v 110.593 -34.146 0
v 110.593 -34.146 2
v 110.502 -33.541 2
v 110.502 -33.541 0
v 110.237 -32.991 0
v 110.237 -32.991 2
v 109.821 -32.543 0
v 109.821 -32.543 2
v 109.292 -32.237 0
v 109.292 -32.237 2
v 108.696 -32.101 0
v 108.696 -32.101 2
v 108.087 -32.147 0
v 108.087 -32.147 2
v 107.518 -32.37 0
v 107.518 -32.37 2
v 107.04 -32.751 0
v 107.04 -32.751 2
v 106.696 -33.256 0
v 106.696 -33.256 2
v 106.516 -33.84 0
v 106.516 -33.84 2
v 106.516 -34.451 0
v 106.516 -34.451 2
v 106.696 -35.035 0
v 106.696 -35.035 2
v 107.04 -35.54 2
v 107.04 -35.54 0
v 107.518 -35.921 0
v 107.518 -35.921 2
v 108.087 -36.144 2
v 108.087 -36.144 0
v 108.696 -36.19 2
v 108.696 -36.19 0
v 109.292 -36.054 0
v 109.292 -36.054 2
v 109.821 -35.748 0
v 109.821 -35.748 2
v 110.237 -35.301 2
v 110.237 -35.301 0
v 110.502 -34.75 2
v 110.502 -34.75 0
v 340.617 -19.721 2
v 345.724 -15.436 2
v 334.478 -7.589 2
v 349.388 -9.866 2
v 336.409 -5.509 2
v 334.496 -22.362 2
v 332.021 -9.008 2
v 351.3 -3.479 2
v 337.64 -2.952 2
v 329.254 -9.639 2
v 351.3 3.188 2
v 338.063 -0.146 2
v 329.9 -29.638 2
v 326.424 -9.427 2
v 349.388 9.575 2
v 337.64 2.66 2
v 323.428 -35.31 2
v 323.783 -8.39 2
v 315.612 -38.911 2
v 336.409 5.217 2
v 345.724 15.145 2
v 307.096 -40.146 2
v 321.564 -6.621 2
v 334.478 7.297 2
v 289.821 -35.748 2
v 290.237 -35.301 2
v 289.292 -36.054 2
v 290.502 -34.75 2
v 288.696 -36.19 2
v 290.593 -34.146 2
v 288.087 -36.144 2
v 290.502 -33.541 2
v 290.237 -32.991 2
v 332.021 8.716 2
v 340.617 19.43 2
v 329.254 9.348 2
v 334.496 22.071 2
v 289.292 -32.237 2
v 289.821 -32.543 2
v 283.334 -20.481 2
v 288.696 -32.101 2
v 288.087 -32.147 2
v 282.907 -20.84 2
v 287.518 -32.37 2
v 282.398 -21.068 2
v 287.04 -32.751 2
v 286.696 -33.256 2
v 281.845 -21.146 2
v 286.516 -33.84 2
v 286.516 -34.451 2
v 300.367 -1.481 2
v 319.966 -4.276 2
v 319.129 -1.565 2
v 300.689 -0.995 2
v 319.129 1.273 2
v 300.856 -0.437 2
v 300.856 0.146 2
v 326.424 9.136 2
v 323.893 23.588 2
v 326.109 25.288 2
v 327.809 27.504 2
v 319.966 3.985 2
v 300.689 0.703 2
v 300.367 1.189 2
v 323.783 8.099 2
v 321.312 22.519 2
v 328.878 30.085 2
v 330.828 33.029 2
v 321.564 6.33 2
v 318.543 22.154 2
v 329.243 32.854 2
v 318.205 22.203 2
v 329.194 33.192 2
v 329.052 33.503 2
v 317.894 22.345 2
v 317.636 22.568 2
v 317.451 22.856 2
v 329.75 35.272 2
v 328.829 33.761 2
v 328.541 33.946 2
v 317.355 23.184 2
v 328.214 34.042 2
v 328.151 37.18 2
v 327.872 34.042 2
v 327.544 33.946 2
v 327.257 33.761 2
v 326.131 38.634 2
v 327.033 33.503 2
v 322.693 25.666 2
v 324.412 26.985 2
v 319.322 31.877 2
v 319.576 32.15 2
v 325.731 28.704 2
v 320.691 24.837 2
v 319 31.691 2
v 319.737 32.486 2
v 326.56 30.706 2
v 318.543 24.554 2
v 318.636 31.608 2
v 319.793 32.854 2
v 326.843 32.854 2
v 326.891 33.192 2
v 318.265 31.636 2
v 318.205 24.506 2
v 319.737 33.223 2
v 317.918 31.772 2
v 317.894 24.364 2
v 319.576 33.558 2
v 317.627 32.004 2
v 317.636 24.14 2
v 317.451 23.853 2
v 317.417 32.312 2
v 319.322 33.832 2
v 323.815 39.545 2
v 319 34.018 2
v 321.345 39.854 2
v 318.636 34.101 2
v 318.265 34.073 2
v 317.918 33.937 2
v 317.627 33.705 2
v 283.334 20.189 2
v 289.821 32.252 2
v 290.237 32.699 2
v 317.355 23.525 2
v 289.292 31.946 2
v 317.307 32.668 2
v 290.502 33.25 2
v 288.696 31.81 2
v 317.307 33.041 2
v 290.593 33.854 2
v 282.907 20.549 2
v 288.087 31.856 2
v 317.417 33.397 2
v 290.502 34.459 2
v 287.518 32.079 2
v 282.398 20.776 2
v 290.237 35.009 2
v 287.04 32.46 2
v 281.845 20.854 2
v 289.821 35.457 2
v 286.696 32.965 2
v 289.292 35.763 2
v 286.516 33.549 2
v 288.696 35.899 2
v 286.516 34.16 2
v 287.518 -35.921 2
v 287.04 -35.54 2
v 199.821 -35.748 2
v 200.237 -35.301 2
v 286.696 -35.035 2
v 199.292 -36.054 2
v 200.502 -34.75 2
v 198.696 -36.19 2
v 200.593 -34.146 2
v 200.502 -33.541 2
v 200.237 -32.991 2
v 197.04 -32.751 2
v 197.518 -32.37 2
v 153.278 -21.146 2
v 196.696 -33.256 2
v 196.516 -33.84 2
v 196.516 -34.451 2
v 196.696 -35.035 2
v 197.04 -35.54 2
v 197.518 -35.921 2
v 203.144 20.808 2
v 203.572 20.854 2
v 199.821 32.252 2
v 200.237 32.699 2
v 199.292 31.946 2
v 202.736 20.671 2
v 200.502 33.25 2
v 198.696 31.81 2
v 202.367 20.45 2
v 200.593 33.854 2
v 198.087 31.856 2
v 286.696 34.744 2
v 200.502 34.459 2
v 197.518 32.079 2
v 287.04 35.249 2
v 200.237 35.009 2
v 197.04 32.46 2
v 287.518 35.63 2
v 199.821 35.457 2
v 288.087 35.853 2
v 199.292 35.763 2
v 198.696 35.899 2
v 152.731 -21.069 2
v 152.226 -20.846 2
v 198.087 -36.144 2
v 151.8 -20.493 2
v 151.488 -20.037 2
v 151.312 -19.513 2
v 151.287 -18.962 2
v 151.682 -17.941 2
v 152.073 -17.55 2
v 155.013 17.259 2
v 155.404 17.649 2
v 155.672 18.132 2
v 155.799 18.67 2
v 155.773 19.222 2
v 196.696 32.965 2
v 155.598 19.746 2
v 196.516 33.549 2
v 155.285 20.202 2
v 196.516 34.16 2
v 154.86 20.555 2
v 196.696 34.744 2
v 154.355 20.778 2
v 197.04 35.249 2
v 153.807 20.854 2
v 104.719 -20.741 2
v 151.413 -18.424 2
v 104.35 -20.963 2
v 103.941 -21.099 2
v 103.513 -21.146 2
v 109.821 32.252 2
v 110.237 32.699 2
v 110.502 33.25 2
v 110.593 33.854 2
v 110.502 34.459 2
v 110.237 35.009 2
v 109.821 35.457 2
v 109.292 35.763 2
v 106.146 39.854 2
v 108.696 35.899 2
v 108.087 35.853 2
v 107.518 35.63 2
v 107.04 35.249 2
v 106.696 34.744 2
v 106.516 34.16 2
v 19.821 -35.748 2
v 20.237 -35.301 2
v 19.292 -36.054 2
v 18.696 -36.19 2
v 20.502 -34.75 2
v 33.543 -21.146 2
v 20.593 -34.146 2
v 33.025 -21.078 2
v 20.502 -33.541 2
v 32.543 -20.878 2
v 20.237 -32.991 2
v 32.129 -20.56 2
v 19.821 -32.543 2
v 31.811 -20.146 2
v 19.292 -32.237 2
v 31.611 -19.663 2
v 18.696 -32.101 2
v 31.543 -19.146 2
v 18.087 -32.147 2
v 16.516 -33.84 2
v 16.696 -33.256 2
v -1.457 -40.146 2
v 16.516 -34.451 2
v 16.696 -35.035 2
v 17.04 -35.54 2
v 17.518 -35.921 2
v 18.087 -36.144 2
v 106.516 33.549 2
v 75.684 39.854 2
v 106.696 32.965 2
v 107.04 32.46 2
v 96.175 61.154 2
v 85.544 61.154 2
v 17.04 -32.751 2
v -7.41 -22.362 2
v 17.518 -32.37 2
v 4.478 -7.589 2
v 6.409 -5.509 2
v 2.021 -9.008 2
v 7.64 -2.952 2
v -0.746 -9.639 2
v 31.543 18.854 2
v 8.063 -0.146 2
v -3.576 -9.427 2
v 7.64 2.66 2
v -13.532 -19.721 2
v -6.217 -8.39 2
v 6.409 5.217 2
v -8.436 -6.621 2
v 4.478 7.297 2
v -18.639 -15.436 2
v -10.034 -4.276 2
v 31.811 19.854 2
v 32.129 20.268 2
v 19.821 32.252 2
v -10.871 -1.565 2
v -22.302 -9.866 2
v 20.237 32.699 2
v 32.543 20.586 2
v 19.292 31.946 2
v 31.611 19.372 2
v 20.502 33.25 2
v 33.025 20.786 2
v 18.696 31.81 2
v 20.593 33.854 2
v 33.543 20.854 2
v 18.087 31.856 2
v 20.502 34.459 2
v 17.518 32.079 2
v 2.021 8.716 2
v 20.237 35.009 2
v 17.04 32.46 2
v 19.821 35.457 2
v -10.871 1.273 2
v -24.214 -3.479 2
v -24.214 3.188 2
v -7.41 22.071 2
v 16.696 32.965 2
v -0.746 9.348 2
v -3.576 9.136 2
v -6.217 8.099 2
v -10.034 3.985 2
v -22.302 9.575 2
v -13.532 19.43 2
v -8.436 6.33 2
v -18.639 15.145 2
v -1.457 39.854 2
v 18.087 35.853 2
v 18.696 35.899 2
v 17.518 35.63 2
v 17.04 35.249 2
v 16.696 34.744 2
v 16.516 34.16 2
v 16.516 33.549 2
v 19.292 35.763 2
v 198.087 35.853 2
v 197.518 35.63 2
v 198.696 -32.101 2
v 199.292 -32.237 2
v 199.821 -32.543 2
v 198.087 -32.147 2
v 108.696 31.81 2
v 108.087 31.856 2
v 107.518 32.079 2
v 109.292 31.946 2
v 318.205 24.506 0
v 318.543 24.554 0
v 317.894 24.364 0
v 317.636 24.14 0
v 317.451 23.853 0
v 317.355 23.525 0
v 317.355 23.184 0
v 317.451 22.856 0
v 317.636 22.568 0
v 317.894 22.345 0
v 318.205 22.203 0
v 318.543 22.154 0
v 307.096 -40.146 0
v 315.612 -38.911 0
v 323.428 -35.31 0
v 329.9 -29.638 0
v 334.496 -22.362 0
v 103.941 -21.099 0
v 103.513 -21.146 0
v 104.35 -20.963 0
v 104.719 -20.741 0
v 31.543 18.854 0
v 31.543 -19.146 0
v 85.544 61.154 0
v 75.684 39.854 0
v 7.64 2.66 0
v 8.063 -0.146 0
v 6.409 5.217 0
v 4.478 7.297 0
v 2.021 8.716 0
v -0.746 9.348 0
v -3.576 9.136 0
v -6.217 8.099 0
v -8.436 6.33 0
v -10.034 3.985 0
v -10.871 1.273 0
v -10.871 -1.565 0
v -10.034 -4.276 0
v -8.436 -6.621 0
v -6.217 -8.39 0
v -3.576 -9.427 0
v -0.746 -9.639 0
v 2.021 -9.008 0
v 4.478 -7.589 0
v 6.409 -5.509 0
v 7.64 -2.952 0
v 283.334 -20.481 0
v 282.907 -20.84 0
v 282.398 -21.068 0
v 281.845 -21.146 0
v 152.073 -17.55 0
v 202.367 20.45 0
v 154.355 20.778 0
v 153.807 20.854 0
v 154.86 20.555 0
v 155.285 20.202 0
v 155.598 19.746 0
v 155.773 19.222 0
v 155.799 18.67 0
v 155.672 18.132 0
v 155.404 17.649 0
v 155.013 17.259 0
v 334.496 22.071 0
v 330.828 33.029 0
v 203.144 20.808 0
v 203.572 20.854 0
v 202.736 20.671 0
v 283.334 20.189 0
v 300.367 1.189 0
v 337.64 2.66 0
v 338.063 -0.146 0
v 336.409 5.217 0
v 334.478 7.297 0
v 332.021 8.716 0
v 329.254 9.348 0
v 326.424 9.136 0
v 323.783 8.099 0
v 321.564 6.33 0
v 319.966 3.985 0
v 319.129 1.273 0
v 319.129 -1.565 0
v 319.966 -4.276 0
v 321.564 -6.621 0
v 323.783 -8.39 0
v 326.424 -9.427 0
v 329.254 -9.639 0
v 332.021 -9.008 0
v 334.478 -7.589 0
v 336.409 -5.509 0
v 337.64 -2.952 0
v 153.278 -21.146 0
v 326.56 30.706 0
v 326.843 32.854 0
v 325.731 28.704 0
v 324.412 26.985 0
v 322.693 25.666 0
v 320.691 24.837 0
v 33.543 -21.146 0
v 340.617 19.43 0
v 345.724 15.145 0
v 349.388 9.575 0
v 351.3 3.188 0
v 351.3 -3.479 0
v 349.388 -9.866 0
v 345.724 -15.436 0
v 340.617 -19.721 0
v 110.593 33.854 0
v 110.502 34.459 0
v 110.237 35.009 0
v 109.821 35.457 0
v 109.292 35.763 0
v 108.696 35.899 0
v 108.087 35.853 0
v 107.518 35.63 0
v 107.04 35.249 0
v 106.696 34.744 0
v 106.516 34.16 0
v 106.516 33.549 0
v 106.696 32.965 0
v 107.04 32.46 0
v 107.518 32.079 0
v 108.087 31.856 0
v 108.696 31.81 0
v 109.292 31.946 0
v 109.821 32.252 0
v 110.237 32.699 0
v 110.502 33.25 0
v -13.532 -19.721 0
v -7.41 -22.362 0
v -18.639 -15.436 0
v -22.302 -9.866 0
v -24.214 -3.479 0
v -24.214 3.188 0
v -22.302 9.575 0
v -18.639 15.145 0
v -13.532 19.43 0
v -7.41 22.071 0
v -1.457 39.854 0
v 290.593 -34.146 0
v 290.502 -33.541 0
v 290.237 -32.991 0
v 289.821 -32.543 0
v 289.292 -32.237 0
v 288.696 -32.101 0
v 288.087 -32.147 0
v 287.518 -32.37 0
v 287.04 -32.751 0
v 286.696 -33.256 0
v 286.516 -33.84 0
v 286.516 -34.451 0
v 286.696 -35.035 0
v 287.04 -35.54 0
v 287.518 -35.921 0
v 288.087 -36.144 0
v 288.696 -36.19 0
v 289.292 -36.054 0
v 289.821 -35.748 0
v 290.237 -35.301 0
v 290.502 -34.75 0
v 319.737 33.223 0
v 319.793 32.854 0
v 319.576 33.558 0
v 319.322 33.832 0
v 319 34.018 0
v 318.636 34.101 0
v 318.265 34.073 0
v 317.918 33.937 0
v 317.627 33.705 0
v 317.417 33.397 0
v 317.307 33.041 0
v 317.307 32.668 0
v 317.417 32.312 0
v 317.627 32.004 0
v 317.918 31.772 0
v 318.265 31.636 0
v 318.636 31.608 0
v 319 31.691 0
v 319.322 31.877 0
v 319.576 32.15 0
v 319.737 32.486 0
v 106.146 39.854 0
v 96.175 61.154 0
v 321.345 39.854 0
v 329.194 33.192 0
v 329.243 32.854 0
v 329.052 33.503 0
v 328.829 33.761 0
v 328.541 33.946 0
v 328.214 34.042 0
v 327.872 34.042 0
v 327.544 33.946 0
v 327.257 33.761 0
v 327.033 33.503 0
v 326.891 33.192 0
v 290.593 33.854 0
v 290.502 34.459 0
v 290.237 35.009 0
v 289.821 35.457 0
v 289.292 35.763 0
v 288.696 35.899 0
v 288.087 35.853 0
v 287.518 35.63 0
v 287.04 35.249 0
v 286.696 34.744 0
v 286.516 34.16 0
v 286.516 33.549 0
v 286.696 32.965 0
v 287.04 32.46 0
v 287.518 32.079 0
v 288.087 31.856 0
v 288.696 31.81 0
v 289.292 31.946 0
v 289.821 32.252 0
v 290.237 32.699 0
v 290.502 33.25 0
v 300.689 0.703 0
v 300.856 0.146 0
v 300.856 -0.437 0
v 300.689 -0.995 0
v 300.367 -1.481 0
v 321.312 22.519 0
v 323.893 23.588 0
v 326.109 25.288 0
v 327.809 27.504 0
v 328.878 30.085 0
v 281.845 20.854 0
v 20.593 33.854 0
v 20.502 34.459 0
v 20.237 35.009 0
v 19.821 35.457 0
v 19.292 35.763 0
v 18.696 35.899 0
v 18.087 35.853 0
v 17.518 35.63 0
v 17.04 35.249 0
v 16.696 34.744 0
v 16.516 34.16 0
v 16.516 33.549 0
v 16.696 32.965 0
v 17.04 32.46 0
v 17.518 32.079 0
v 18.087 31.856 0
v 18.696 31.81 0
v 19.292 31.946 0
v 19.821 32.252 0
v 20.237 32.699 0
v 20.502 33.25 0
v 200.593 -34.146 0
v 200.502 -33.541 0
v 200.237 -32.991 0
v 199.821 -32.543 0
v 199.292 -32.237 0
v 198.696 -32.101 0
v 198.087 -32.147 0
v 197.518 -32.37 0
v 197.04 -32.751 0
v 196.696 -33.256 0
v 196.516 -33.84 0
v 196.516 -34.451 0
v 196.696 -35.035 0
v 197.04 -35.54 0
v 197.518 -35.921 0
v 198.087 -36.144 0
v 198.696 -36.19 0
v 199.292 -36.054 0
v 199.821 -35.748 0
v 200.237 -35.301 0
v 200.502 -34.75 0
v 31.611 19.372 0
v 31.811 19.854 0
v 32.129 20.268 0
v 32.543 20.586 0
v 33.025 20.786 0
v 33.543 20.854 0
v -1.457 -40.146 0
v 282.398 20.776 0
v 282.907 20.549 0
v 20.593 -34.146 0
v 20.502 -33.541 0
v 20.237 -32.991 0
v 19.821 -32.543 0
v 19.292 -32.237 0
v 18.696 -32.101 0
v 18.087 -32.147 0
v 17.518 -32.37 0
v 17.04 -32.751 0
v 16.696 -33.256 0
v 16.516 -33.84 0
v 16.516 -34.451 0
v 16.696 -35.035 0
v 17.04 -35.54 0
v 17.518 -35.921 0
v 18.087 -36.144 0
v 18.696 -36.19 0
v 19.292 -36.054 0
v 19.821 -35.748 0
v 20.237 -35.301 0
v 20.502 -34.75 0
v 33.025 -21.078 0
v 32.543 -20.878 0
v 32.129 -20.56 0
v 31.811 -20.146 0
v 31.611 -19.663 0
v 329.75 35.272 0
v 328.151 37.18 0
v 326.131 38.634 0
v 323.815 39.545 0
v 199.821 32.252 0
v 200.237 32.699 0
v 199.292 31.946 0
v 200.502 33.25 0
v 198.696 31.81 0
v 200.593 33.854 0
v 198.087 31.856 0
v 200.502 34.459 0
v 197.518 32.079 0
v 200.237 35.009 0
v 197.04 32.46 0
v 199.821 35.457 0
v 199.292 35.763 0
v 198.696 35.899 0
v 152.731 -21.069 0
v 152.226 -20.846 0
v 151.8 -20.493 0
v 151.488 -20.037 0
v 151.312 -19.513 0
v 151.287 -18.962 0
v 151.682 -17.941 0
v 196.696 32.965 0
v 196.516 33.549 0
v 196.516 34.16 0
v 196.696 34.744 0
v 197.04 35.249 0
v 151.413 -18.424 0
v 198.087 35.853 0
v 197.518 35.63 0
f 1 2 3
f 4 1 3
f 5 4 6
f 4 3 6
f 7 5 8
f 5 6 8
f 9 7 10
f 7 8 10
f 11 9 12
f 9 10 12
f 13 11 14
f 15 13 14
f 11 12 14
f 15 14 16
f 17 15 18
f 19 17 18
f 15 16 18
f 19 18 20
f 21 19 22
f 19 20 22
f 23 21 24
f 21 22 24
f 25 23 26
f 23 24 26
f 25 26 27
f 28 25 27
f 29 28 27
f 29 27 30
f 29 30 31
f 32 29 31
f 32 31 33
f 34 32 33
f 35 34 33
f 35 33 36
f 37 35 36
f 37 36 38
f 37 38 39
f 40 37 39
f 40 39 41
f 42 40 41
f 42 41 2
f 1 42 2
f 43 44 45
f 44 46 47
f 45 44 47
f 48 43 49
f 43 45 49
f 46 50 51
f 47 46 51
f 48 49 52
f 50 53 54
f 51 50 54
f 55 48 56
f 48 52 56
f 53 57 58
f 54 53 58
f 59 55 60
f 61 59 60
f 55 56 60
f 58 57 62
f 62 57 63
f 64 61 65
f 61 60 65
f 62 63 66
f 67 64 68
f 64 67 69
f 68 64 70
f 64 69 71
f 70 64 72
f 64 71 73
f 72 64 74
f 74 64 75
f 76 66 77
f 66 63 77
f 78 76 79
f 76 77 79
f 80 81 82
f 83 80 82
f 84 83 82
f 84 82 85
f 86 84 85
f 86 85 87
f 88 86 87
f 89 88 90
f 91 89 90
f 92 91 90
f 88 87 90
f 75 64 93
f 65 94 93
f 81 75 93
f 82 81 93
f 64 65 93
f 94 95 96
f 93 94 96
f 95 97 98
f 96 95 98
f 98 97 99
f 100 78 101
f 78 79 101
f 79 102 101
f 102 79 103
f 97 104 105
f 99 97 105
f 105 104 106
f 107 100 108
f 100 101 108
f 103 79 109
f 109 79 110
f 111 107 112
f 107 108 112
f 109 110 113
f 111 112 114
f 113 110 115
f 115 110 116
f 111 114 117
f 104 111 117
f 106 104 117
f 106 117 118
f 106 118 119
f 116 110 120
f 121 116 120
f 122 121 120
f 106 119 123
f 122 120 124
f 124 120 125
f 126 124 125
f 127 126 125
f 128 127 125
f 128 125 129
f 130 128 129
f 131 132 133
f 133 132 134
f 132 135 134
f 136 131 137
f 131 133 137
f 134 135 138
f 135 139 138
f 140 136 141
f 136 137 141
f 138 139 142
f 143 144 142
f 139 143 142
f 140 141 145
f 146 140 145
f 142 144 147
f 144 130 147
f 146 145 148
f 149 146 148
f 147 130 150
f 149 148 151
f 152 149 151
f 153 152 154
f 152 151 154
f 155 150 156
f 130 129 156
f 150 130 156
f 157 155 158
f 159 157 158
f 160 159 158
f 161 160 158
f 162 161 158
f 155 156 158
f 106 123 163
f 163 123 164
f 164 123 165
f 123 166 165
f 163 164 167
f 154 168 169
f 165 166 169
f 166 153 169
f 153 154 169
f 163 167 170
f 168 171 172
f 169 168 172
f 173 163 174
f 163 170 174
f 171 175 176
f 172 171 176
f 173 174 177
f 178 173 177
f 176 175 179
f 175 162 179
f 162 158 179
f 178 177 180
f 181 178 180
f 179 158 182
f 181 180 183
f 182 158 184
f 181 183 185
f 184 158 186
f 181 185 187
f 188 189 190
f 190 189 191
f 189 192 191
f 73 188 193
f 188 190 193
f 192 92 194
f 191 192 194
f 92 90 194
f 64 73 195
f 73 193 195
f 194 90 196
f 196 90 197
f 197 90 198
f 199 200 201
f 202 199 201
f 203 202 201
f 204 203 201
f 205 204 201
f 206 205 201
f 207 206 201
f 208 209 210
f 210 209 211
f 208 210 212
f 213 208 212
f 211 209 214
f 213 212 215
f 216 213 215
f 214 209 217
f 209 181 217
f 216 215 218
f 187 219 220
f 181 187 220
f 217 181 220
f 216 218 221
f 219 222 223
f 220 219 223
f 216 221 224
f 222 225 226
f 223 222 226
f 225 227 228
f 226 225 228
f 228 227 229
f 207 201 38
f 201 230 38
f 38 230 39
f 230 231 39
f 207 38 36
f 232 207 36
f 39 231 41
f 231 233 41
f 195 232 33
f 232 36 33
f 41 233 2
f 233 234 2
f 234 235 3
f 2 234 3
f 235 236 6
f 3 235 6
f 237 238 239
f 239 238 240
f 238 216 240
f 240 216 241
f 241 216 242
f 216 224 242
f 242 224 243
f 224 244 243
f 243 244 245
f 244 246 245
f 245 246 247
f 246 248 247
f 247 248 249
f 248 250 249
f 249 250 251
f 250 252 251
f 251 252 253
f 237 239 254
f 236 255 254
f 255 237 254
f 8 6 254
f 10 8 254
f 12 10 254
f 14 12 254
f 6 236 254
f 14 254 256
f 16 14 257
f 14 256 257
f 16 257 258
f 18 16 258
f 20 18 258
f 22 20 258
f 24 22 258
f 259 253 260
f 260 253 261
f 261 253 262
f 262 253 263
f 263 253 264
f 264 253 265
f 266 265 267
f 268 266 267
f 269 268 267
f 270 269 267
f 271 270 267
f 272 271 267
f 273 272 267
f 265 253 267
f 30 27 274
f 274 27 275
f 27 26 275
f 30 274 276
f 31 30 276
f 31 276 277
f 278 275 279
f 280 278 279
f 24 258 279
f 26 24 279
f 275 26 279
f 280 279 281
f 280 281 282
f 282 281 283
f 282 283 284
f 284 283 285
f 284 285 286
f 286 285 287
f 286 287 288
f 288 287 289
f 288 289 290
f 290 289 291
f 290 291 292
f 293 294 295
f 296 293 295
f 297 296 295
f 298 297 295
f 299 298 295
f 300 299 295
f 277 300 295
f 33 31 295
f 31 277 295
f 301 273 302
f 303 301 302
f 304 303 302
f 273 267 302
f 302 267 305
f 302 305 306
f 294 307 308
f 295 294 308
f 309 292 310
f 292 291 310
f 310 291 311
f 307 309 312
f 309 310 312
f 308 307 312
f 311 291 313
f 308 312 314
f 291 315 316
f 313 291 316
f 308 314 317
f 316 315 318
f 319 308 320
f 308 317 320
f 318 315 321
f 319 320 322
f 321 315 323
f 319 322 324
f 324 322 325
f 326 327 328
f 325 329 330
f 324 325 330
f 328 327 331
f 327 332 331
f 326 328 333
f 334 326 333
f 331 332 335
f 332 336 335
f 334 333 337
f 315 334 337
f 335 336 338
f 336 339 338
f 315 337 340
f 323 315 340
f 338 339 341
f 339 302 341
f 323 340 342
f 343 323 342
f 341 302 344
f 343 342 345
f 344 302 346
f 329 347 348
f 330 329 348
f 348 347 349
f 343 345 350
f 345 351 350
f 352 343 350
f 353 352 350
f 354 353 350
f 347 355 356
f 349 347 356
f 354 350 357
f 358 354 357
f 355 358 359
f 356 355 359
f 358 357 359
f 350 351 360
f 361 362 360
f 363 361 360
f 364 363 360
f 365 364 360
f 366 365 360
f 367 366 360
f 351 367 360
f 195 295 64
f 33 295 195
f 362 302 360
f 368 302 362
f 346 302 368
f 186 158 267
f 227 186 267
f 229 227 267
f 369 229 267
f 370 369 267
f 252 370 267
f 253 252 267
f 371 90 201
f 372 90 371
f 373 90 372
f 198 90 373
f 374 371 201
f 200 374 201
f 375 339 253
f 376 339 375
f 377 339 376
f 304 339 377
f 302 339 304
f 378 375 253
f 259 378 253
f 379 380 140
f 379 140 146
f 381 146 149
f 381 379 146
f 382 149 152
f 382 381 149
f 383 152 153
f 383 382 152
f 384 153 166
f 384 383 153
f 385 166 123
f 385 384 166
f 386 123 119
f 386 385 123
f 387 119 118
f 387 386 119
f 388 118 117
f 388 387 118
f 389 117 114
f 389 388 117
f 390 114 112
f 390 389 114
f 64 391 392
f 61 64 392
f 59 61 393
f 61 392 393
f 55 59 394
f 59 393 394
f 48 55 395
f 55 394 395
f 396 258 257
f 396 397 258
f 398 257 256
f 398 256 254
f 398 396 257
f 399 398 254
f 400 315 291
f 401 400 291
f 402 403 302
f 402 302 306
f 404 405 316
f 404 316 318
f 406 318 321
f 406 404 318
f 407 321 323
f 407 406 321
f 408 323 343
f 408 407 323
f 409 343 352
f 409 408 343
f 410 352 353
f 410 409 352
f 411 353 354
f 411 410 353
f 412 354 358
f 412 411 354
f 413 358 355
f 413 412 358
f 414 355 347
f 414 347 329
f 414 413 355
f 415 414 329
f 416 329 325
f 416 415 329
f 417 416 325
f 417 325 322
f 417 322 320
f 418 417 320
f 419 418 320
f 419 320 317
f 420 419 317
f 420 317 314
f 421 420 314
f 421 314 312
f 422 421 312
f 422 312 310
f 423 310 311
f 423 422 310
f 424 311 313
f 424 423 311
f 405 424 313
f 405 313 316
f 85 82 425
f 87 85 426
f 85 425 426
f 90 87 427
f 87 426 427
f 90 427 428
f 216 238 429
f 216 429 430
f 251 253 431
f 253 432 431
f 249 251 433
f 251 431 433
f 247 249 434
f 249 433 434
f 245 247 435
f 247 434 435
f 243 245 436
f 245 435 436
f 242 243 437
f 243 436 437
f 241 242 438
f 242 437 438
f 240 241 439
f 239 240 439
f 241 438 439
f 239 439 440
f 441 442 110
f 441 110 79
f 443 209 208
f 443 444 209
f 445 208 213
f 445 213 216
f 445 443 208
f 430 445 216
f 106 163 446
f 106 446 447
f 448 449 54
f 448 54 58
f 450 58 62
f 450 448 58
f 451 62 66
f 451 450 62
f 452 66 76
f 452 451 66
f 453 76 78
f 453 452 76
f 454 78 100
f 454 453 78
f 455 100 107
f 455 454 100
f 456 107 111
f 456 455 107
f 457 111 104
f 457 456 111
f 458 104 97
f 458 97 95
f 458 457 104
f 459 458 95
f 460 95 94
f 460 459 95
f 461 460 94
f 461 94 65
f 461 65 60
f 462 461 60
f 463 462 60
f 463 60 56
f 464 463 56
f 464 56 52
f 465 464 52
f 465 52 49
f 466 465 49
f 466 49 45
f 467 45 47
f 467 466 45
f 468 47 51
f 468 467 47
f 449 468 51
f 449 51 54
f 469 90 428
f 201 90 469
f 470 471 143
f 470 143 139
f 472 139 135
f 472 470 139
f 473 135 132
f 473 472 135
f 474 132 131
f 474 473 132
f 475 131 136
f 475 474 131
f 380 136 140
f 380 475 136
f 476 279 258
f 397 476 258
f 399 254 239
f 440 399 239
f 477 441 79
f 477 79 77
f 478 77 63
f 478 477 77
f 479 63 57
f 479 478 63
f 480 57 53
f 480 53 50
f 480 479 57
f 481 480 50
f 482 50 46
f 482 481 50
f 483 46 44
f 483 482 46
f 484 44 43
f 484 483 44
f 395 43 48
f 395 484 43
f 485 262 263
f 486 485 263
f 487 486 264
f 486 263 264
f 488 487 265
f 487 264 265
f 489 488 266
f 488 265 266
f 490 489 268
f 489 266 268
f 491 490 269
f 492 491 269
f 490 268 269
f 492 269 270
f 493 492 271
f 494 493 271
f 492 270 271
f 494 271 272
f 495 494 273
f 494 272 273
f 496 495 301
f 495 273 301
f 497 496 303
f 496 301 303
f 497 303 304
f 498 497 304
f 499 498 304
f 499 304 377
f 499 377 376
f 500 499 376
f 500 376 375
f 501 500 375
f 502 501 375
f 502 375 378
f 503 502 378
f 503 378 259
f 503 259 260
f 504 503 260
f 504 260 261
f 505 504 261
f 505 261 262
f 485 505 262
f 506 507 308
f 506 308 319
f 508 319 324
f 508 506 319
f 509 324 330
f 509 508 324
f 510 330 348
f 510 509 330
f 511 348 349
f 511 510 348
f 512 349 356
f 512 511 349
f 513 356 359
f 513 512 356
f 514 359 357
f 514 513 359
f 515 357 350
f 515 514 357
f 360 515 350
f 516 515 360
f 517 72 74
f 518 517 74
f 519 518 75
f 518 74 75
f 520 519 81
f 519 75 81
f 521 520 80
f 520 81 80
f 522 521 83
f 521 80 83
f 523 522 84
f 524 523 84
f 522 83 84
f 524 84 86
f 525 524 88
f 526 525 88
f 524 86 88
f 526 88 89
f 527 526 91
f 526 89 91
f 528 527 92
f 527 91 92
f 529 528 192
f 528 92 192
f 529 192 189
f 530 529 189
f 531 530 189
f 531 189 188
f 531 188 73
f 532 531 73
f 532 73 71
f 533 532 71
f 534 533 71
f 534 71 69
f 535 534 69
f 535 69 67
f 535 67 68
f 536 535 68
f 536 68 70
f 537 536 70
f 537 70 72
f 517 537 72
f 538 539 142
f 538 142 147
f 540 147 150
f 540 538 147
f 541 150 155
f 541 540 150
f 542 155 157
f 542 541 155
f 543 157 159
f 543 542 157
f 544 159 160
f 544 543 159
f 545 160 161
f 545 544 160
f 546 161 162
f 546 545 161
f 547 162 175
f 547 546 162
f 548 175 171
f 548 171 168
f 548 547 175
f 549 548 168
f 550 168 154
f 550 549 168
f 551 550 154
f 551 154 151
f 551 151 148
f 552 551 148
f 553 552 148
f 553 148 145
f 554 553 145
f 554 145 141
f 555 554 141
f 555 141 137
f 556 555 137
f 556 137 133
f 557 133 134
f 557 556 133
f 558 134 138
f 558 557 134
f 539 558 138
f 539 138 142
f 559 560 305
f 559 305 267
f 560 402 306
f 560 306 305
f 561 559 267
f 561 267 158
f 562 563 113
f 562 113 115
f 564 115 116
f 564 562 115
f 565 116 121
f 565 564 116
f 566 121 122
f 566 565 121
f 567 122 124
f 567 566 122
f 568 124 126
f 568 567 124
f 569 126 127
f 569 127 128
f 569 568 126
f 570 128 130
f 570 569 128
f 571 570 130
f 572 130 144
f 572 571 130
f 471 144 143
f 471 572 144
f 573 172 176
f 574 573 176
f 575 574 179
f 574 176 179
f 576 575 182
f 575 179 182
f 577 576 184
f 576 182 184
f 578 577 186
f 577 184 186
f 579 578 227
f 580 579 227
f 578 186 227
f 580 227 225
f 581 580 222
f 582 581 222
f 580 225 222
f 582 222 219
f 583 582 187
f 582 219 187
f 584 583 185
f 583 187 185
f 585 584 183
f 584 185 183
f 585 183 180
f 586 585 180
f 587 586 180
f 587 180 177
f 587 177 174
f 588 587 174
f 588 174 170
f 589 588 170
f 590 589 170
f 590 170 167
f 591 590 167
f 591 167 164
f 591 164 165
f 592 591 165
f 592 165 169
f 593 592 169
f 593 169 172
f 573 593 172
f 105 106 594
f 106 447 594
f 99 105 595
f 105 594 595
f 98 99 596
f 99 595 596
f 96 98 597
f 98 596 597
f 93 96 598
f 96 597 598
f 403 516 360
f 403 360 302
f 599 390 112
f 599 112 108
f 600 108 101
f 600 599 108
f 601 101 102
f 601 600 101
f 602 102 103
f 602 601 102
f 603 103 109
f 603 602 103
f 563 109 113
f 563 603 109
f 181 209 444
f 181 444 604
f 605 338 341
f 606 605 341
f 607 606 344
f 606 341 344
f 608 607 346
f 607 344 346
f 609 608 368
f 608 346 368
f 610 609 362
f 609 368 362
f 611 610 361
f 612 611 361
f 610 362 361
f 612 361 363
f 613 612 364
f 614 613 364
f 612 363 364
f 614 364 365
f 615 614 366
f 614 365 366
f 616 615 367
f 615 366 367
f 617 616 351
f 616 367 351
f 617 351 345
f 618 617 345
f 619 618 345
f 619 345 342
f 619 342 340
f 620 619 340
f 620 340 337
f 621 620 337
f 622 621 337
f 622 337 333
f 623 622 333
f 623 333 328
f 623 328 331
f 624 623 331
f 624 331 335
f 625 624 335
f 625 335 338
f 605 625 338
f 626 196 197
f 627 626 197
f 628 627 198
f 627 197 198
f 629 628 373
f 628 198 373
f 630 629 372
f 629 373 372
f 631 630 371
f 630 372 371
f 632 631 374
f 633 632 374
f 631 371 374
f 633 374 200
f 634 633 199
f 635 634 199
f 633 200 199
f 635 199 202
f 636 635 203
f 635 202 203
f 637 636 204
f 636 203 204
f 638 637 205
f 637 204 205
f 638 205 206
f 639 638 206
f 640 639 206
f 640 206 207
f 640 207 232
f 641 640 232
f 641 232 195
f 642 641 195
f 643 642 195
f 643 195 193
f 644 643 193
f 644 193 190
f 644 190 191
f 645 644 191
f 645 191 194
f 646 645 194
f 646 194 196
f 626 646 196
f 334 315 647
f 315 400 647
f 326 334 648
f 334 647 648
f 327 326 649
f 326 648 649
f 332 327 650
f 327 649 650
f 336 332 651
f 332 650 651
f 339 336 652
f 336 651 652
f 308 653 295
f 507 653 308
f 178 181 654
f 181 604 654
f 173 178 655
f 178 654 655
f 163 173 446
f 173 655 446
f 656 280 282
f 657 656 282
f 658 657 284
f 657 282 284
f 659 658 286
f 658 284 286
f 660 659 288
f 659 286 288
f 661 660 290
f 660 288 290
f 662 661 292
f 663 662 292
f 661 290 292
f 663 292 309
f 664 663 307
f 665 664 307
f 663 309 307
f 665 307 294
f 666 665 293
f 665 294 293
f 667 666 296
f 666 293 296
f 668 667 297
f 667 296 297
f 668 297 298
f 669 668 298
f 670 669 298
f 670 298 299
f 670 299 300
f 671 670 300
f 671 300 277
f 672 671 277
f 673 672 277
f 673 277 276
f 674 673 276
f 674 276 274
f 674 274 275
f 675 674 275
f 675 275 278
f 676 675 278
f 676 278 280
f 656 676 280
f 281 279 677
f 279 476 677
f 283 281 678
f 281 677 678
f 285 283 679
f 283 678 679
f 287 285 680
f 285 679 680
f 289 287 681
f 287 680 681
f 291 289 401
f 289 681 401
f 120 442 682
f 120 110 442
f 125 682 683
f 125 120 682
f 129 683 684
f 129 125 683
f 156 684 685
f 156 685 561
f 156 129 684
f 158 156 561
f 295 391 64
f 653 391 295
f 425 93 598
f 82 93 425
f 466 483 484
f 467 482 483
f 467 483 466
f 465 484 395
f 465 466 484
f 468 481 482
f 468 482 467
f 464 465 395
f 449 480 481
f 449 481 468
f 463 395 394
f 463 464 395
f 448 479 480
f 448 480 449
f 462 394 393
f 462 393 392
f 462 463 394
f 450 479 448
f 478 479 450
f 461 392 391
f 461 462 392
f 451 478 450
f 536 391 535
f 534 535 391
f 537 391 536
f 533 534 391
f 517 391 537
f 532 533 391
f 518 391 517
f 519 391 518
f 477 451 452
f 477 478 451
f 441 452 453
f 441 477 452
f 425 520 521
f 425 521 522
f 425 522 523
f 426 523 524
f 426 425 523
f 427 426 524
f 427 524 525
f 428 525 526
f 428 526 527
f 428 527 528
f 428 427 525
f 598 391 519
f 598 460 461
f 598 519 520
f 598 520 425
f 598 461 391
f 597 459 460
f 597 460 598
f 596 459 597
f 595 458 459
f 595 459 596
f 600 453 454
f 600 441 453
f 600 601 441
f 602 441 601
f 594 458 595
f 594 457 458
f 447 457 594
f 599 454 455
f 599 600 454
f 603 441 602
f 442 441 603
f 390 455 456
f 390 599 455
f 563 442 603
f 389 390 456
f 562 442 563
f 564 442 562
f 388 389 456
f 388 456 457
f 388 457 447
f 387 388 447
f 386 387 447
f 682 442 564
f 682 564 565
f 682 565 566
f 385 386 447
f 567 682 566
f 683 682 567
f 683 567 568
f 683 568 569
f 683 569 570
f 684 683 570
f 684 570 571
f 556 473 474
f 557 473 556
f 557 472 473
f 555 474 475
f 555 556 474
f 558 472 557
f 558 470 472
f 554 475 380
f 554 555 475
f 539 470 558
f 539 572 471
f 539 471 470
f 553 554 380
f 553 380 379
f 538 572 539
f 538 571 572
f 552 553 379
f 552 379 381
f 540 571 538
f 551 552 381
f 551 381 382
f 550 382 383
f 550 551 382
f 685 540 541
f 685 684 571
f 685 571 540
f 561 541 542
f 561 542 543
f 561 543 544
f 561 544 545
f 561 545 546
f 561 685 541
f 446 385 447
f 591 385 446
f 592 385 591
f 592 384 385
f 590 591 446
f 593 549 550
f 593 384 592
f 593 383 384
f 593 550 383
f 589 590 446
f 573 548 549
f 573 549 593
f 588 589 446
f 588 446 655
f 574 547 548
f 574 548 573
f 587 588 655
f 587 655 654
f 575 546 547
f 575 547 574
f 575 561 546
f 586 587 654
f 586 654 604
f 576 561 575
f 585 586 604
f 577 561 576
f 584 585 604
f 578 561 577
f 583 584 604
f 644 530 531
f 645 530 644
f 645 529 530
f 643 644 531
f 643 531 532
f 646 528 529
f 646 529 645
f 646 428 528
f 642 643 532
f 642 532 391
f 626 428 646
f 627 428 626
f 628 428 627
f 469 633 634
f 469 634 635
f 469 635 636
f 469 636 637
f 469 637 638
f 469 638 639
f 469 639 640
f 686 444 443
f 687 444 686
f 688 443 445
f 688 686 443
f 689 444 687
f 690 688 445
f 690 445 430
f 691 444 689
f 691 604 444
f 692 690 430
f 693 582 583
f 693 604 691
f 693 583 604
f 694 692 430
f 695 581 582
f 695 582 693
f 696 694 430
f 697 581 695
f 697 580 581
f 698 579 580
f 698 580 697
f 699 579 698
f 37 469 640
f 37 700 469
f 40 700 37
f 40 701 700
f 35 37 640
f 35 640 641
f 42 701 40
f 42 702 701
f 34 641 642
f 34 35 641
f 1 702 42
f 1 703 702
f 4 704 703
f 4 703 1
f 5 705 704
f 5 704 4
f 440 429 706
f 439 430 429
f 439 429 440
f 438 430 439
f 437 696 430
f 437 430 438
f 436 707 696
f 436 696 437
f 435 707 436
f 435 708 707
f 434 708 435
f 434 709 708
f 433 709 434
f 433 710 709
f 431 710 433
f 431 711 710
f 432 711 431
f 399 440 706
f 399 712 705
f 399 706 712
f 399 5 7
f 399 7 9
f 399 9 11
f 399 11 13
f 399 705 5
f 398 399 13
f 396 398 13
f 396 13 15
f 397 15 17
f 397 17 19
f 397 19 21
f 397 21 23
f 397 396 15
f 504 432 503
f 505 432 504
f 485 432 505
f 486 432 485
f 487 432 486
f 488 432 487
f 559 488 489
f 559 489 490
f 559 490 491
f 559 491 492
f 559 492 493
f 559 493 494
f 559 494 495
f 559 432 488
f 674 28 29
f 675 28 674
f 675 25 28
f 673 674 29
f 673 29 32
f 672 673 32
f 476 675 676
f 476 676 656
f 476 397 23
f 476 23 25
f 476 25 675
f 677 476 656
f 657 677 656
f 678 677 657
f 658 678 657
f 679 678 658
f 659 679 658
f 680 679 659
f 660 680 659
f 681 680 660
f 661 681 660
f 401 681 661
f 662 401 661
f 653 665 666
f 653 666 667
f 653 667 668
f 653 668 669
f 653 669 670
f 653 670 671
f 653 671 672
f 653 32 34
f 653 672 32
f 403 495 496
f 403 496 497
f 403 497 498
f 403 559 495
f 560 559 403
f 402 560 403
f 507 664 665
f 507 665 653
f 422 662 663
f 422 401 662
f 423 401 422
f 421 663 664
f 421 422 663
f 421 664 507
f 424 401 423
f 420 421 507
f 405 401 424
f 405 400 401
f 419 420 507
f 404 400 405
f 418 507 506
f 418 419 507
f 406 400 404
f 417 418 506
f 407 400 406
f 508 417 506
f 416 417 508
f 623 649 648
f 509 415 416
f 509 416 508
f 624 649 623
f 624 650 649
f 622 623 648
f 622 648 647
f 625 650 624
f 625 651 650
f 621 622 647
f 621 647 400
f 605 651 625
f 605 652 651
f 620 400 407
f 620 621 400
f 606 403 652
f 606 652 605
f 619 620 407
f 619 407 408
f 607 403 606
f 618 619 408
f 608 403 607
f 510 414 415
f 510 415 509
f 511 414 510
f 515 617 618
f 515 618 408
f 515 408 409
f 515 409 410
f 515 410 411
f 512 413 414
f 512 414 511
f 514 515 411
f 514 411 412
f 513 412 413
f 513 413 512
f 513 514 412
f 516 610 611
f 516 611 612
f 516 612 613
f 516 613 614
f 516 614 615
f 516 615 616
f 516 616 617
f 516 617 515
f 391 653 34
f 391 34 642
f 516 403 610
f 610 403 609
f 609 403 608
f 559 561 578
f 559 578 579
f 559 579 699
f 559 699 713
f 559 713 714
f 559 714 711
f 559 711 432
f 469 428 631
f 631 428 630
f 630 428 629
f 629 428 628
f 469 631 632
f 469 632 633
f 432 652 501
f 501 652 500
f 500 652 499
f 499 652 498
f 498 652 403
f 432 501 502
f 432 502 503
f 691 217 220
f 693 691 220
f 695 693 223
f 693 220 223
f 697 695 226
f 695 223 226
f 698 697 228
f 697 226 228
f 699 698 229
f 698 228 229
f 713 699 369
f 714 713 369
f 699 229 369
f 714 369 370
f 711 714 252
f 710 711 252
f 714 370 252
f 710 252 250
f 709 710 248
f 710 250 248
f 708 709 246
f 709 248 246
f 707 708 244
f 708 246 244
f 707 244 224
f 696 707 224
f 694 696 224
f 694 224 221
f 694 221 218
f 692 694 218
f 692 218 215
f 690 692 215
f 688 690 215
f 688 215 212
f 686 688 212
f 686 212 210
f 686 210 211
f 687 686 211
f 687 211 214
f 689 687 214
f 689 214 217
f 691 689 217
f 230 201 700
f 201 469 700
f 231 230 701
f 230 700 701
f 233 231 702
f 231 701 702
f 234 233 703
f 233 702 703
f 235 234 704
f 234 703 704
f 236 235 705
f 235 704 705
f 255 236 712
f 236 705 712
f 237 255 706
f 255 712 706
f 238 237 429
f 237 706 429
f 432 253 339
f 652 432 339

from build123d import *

# Parameters (mm, degrees)
SKETCH_1_R          = 9.52
SKETCH_1_R_2        = 1.25
EXTRUDE_1_DEPTH     = 2
SKETCH_2_R          = 2.05
CUT_EXTRUDE_1_DEPTH = 4
FILLET_1_R          = 2
FILLET_3_R          = 30
FILLET_6_R          = 10


with BuildPart() as part:
    # 草图1 → 凸台-拉伸1 (new body)
    with BuildSketch(Plane.XY):
        with BuildLine():
            Line((328.542857143, -40.145714286), (-1.457142857, -40.145714286))
            Line((-1.457142857, -40.145714286), (-7.409980895, -22.36200829))
            ThreePointArc((-7.409980895, -22.36200829), (-24.457142857, -0.145714286), (-7.409980895, 22.070579719))
            Line((-7.409980895, 22.070579719), (-1.457142857, 39.854285714))
            Line((-1.457142857, 39.854285714), (75.684411109, 39.854285714))
            Line((75.684411109, 39.854285714), (85.544413109, 61.154285714))
            Line((85.544413109, 61.154285714), (96.174870529, 61.154285714))
            Line((96.174870529, 61.154285714), (106.145912956, 39.854285714))
            Line((106.145912956, 39.854285714), (321.071621128, 39.854285714))
            Line((321.071621128, 39.854285714), (328.542857143, 39.854285714))
            Line((328.542857143, 39.854285714), (334.49569518, 22.070579719))
            ThreePointArc((334.49569518, 22.070579719), (351.542857143, -0.145714286), (334.49569518, -22.36200829))
            Line((334.49569518, -22.36200829), (328.542857143, -40.145714286))
        make_face()
        with Locations((-1.457142857, -0.145714286)):
            Circle(SKETCH_1_R, mode=Mode.SUBTRACT)
        with Locations((328.542857143, -0.145714286)):
            Circle(SKETCH_1_R, mode=Mode.SUBTRACT)
        with Locations((318.542857143, 32.854285714)):
            Circle(SKETCH_1_R_2, mode=Mode.SUBTRACT)
        with BuildLine():
            ThreePointArc((318.542857143, 22.154285714), (326.108899702, 25.288243156), (329.242857143, 32.854285714))
            ThreePointArc((329.242857143, 32.854285714), (328.042857143, 34.054285714), (326.842857143, 32.854285714))
            ThreePointArc((326.842857143, 32.854285714), (324.411843427, 26.98529943), (318.542857143, 24.554285714))
            ThreePointArc((318.542857143, 24.554285714), (317.342857143, 23.354285714), (318.542857143, 22.154285714))
        make_face(mode=Mode.SUBTRACT)
    extrude(amount=EXTRUDE_1_DEPTH)

    # 草图2 → 切除-拉伸1 (cut)
    with BuildSketch(Plane.XY.offset(2)):
        with Locations((108.542857143, 33.854285714)):
            Circle(SKETCH_2_R)
        with Locations((198.542857143, 33.854285714)):
            Circle(SKETCH_2_R)
        with Locations((288.542857143, 33.854285714)):
            Circle(SKETCH_2_R)
        with Locations((108.542857143, -34.145714286)):
            Circle(SKETCH_2_R)
        with Locations((198.542857143, -34.145714286)):
            Circle(SKETCH_2_R)
        with Locations((288.542857143, -34.145714286)):
            Circle(SKETCH_2_R)
        with Locations((18.542857143, -34.145714286)):
            Circle(SKETCH_2_R)
        with Locations((18.542857143, 33.854285714)):
            Circle(SKETCH_2_R)
        Polygon((31.542857143, -21.145714286), (104.183898028, -21.145714286), (159.772133322, 20.854285714), (31.542857143, 20.854285714), align=None)
        Polygon((147.313580964, -21.145714286), (202.901816258, 20.854285714), (282.737923896, 20.854285714), (301.563806249, -0.145714286), (282.737923896, -21.145714286), align=None)
    extrude(amount=-CUT_EXTRUDE_1_DEPTH, mode=Mode.SUBTRACT)

    # 圆角1
    fillet_1_edges = [part.edges().sort_by_distance(p)[0] for p in [
        (202.901816258, 20.854285714, 1),
        (282.737923896, 20.854285714, 1),
        (301.563806249, -0.145714286, 1),
        (31.542857143, -21.145714286, 1),
        (31.542857143, 20.854285714, 1),
        (159.772133322, 20.854285714, 1),
        (104.183898028, -21.145714286, 1),
        (282.737923896, -21.145714286, 1),
        (147.313580964, -21.145714286, 1),
    ]]
    fillet(fillet_1_edges, radius=FILLET_1_R)

    # 圆角3
    # the kernel refuses this fillet: 30 mm, written as the material it takes off along each edge
    with BuildSketch(Plane(origin=(328.542857143, -40.145714286, -53.618003483), x_dir=(0.3174242162824087, 0.9482836426499714, 0), z_dir=(0, 0, 1))) as fillet_3_piece_1:
        with BuildLine():
            CenterArc((21.640648186, 29.86075675), FILLET_3_R, 198.507223716, 65.970321092)
            Line((-6.807861094, 20.338030262), (-7.376831279, 20.147575732))
            Line((-7.376831279, 20.147575732), (-0.568970186, -0.19045453))
            Line((-0.568970186, -0.19045453), (0, -0.6))
            ThreePointArc((0, -0.6), (9.376786225, -0.6), (18.695830935, -0.597215135))
            Line((18.695830935, -0.597215135), (18.75357245, 0))
        make_face()
    extrude(amount=109.236006966, mode=Mode.SUBTRACT)

    # 圆角6
    fillet_6_edges = [part.edges().sort_by_distance(p)[0] for p in [
        (328.542857143, 39.854285714, 1),
    ]]
    fillet(fillet_6_edges, radius=FILLET_6_R)


solid = part.part
